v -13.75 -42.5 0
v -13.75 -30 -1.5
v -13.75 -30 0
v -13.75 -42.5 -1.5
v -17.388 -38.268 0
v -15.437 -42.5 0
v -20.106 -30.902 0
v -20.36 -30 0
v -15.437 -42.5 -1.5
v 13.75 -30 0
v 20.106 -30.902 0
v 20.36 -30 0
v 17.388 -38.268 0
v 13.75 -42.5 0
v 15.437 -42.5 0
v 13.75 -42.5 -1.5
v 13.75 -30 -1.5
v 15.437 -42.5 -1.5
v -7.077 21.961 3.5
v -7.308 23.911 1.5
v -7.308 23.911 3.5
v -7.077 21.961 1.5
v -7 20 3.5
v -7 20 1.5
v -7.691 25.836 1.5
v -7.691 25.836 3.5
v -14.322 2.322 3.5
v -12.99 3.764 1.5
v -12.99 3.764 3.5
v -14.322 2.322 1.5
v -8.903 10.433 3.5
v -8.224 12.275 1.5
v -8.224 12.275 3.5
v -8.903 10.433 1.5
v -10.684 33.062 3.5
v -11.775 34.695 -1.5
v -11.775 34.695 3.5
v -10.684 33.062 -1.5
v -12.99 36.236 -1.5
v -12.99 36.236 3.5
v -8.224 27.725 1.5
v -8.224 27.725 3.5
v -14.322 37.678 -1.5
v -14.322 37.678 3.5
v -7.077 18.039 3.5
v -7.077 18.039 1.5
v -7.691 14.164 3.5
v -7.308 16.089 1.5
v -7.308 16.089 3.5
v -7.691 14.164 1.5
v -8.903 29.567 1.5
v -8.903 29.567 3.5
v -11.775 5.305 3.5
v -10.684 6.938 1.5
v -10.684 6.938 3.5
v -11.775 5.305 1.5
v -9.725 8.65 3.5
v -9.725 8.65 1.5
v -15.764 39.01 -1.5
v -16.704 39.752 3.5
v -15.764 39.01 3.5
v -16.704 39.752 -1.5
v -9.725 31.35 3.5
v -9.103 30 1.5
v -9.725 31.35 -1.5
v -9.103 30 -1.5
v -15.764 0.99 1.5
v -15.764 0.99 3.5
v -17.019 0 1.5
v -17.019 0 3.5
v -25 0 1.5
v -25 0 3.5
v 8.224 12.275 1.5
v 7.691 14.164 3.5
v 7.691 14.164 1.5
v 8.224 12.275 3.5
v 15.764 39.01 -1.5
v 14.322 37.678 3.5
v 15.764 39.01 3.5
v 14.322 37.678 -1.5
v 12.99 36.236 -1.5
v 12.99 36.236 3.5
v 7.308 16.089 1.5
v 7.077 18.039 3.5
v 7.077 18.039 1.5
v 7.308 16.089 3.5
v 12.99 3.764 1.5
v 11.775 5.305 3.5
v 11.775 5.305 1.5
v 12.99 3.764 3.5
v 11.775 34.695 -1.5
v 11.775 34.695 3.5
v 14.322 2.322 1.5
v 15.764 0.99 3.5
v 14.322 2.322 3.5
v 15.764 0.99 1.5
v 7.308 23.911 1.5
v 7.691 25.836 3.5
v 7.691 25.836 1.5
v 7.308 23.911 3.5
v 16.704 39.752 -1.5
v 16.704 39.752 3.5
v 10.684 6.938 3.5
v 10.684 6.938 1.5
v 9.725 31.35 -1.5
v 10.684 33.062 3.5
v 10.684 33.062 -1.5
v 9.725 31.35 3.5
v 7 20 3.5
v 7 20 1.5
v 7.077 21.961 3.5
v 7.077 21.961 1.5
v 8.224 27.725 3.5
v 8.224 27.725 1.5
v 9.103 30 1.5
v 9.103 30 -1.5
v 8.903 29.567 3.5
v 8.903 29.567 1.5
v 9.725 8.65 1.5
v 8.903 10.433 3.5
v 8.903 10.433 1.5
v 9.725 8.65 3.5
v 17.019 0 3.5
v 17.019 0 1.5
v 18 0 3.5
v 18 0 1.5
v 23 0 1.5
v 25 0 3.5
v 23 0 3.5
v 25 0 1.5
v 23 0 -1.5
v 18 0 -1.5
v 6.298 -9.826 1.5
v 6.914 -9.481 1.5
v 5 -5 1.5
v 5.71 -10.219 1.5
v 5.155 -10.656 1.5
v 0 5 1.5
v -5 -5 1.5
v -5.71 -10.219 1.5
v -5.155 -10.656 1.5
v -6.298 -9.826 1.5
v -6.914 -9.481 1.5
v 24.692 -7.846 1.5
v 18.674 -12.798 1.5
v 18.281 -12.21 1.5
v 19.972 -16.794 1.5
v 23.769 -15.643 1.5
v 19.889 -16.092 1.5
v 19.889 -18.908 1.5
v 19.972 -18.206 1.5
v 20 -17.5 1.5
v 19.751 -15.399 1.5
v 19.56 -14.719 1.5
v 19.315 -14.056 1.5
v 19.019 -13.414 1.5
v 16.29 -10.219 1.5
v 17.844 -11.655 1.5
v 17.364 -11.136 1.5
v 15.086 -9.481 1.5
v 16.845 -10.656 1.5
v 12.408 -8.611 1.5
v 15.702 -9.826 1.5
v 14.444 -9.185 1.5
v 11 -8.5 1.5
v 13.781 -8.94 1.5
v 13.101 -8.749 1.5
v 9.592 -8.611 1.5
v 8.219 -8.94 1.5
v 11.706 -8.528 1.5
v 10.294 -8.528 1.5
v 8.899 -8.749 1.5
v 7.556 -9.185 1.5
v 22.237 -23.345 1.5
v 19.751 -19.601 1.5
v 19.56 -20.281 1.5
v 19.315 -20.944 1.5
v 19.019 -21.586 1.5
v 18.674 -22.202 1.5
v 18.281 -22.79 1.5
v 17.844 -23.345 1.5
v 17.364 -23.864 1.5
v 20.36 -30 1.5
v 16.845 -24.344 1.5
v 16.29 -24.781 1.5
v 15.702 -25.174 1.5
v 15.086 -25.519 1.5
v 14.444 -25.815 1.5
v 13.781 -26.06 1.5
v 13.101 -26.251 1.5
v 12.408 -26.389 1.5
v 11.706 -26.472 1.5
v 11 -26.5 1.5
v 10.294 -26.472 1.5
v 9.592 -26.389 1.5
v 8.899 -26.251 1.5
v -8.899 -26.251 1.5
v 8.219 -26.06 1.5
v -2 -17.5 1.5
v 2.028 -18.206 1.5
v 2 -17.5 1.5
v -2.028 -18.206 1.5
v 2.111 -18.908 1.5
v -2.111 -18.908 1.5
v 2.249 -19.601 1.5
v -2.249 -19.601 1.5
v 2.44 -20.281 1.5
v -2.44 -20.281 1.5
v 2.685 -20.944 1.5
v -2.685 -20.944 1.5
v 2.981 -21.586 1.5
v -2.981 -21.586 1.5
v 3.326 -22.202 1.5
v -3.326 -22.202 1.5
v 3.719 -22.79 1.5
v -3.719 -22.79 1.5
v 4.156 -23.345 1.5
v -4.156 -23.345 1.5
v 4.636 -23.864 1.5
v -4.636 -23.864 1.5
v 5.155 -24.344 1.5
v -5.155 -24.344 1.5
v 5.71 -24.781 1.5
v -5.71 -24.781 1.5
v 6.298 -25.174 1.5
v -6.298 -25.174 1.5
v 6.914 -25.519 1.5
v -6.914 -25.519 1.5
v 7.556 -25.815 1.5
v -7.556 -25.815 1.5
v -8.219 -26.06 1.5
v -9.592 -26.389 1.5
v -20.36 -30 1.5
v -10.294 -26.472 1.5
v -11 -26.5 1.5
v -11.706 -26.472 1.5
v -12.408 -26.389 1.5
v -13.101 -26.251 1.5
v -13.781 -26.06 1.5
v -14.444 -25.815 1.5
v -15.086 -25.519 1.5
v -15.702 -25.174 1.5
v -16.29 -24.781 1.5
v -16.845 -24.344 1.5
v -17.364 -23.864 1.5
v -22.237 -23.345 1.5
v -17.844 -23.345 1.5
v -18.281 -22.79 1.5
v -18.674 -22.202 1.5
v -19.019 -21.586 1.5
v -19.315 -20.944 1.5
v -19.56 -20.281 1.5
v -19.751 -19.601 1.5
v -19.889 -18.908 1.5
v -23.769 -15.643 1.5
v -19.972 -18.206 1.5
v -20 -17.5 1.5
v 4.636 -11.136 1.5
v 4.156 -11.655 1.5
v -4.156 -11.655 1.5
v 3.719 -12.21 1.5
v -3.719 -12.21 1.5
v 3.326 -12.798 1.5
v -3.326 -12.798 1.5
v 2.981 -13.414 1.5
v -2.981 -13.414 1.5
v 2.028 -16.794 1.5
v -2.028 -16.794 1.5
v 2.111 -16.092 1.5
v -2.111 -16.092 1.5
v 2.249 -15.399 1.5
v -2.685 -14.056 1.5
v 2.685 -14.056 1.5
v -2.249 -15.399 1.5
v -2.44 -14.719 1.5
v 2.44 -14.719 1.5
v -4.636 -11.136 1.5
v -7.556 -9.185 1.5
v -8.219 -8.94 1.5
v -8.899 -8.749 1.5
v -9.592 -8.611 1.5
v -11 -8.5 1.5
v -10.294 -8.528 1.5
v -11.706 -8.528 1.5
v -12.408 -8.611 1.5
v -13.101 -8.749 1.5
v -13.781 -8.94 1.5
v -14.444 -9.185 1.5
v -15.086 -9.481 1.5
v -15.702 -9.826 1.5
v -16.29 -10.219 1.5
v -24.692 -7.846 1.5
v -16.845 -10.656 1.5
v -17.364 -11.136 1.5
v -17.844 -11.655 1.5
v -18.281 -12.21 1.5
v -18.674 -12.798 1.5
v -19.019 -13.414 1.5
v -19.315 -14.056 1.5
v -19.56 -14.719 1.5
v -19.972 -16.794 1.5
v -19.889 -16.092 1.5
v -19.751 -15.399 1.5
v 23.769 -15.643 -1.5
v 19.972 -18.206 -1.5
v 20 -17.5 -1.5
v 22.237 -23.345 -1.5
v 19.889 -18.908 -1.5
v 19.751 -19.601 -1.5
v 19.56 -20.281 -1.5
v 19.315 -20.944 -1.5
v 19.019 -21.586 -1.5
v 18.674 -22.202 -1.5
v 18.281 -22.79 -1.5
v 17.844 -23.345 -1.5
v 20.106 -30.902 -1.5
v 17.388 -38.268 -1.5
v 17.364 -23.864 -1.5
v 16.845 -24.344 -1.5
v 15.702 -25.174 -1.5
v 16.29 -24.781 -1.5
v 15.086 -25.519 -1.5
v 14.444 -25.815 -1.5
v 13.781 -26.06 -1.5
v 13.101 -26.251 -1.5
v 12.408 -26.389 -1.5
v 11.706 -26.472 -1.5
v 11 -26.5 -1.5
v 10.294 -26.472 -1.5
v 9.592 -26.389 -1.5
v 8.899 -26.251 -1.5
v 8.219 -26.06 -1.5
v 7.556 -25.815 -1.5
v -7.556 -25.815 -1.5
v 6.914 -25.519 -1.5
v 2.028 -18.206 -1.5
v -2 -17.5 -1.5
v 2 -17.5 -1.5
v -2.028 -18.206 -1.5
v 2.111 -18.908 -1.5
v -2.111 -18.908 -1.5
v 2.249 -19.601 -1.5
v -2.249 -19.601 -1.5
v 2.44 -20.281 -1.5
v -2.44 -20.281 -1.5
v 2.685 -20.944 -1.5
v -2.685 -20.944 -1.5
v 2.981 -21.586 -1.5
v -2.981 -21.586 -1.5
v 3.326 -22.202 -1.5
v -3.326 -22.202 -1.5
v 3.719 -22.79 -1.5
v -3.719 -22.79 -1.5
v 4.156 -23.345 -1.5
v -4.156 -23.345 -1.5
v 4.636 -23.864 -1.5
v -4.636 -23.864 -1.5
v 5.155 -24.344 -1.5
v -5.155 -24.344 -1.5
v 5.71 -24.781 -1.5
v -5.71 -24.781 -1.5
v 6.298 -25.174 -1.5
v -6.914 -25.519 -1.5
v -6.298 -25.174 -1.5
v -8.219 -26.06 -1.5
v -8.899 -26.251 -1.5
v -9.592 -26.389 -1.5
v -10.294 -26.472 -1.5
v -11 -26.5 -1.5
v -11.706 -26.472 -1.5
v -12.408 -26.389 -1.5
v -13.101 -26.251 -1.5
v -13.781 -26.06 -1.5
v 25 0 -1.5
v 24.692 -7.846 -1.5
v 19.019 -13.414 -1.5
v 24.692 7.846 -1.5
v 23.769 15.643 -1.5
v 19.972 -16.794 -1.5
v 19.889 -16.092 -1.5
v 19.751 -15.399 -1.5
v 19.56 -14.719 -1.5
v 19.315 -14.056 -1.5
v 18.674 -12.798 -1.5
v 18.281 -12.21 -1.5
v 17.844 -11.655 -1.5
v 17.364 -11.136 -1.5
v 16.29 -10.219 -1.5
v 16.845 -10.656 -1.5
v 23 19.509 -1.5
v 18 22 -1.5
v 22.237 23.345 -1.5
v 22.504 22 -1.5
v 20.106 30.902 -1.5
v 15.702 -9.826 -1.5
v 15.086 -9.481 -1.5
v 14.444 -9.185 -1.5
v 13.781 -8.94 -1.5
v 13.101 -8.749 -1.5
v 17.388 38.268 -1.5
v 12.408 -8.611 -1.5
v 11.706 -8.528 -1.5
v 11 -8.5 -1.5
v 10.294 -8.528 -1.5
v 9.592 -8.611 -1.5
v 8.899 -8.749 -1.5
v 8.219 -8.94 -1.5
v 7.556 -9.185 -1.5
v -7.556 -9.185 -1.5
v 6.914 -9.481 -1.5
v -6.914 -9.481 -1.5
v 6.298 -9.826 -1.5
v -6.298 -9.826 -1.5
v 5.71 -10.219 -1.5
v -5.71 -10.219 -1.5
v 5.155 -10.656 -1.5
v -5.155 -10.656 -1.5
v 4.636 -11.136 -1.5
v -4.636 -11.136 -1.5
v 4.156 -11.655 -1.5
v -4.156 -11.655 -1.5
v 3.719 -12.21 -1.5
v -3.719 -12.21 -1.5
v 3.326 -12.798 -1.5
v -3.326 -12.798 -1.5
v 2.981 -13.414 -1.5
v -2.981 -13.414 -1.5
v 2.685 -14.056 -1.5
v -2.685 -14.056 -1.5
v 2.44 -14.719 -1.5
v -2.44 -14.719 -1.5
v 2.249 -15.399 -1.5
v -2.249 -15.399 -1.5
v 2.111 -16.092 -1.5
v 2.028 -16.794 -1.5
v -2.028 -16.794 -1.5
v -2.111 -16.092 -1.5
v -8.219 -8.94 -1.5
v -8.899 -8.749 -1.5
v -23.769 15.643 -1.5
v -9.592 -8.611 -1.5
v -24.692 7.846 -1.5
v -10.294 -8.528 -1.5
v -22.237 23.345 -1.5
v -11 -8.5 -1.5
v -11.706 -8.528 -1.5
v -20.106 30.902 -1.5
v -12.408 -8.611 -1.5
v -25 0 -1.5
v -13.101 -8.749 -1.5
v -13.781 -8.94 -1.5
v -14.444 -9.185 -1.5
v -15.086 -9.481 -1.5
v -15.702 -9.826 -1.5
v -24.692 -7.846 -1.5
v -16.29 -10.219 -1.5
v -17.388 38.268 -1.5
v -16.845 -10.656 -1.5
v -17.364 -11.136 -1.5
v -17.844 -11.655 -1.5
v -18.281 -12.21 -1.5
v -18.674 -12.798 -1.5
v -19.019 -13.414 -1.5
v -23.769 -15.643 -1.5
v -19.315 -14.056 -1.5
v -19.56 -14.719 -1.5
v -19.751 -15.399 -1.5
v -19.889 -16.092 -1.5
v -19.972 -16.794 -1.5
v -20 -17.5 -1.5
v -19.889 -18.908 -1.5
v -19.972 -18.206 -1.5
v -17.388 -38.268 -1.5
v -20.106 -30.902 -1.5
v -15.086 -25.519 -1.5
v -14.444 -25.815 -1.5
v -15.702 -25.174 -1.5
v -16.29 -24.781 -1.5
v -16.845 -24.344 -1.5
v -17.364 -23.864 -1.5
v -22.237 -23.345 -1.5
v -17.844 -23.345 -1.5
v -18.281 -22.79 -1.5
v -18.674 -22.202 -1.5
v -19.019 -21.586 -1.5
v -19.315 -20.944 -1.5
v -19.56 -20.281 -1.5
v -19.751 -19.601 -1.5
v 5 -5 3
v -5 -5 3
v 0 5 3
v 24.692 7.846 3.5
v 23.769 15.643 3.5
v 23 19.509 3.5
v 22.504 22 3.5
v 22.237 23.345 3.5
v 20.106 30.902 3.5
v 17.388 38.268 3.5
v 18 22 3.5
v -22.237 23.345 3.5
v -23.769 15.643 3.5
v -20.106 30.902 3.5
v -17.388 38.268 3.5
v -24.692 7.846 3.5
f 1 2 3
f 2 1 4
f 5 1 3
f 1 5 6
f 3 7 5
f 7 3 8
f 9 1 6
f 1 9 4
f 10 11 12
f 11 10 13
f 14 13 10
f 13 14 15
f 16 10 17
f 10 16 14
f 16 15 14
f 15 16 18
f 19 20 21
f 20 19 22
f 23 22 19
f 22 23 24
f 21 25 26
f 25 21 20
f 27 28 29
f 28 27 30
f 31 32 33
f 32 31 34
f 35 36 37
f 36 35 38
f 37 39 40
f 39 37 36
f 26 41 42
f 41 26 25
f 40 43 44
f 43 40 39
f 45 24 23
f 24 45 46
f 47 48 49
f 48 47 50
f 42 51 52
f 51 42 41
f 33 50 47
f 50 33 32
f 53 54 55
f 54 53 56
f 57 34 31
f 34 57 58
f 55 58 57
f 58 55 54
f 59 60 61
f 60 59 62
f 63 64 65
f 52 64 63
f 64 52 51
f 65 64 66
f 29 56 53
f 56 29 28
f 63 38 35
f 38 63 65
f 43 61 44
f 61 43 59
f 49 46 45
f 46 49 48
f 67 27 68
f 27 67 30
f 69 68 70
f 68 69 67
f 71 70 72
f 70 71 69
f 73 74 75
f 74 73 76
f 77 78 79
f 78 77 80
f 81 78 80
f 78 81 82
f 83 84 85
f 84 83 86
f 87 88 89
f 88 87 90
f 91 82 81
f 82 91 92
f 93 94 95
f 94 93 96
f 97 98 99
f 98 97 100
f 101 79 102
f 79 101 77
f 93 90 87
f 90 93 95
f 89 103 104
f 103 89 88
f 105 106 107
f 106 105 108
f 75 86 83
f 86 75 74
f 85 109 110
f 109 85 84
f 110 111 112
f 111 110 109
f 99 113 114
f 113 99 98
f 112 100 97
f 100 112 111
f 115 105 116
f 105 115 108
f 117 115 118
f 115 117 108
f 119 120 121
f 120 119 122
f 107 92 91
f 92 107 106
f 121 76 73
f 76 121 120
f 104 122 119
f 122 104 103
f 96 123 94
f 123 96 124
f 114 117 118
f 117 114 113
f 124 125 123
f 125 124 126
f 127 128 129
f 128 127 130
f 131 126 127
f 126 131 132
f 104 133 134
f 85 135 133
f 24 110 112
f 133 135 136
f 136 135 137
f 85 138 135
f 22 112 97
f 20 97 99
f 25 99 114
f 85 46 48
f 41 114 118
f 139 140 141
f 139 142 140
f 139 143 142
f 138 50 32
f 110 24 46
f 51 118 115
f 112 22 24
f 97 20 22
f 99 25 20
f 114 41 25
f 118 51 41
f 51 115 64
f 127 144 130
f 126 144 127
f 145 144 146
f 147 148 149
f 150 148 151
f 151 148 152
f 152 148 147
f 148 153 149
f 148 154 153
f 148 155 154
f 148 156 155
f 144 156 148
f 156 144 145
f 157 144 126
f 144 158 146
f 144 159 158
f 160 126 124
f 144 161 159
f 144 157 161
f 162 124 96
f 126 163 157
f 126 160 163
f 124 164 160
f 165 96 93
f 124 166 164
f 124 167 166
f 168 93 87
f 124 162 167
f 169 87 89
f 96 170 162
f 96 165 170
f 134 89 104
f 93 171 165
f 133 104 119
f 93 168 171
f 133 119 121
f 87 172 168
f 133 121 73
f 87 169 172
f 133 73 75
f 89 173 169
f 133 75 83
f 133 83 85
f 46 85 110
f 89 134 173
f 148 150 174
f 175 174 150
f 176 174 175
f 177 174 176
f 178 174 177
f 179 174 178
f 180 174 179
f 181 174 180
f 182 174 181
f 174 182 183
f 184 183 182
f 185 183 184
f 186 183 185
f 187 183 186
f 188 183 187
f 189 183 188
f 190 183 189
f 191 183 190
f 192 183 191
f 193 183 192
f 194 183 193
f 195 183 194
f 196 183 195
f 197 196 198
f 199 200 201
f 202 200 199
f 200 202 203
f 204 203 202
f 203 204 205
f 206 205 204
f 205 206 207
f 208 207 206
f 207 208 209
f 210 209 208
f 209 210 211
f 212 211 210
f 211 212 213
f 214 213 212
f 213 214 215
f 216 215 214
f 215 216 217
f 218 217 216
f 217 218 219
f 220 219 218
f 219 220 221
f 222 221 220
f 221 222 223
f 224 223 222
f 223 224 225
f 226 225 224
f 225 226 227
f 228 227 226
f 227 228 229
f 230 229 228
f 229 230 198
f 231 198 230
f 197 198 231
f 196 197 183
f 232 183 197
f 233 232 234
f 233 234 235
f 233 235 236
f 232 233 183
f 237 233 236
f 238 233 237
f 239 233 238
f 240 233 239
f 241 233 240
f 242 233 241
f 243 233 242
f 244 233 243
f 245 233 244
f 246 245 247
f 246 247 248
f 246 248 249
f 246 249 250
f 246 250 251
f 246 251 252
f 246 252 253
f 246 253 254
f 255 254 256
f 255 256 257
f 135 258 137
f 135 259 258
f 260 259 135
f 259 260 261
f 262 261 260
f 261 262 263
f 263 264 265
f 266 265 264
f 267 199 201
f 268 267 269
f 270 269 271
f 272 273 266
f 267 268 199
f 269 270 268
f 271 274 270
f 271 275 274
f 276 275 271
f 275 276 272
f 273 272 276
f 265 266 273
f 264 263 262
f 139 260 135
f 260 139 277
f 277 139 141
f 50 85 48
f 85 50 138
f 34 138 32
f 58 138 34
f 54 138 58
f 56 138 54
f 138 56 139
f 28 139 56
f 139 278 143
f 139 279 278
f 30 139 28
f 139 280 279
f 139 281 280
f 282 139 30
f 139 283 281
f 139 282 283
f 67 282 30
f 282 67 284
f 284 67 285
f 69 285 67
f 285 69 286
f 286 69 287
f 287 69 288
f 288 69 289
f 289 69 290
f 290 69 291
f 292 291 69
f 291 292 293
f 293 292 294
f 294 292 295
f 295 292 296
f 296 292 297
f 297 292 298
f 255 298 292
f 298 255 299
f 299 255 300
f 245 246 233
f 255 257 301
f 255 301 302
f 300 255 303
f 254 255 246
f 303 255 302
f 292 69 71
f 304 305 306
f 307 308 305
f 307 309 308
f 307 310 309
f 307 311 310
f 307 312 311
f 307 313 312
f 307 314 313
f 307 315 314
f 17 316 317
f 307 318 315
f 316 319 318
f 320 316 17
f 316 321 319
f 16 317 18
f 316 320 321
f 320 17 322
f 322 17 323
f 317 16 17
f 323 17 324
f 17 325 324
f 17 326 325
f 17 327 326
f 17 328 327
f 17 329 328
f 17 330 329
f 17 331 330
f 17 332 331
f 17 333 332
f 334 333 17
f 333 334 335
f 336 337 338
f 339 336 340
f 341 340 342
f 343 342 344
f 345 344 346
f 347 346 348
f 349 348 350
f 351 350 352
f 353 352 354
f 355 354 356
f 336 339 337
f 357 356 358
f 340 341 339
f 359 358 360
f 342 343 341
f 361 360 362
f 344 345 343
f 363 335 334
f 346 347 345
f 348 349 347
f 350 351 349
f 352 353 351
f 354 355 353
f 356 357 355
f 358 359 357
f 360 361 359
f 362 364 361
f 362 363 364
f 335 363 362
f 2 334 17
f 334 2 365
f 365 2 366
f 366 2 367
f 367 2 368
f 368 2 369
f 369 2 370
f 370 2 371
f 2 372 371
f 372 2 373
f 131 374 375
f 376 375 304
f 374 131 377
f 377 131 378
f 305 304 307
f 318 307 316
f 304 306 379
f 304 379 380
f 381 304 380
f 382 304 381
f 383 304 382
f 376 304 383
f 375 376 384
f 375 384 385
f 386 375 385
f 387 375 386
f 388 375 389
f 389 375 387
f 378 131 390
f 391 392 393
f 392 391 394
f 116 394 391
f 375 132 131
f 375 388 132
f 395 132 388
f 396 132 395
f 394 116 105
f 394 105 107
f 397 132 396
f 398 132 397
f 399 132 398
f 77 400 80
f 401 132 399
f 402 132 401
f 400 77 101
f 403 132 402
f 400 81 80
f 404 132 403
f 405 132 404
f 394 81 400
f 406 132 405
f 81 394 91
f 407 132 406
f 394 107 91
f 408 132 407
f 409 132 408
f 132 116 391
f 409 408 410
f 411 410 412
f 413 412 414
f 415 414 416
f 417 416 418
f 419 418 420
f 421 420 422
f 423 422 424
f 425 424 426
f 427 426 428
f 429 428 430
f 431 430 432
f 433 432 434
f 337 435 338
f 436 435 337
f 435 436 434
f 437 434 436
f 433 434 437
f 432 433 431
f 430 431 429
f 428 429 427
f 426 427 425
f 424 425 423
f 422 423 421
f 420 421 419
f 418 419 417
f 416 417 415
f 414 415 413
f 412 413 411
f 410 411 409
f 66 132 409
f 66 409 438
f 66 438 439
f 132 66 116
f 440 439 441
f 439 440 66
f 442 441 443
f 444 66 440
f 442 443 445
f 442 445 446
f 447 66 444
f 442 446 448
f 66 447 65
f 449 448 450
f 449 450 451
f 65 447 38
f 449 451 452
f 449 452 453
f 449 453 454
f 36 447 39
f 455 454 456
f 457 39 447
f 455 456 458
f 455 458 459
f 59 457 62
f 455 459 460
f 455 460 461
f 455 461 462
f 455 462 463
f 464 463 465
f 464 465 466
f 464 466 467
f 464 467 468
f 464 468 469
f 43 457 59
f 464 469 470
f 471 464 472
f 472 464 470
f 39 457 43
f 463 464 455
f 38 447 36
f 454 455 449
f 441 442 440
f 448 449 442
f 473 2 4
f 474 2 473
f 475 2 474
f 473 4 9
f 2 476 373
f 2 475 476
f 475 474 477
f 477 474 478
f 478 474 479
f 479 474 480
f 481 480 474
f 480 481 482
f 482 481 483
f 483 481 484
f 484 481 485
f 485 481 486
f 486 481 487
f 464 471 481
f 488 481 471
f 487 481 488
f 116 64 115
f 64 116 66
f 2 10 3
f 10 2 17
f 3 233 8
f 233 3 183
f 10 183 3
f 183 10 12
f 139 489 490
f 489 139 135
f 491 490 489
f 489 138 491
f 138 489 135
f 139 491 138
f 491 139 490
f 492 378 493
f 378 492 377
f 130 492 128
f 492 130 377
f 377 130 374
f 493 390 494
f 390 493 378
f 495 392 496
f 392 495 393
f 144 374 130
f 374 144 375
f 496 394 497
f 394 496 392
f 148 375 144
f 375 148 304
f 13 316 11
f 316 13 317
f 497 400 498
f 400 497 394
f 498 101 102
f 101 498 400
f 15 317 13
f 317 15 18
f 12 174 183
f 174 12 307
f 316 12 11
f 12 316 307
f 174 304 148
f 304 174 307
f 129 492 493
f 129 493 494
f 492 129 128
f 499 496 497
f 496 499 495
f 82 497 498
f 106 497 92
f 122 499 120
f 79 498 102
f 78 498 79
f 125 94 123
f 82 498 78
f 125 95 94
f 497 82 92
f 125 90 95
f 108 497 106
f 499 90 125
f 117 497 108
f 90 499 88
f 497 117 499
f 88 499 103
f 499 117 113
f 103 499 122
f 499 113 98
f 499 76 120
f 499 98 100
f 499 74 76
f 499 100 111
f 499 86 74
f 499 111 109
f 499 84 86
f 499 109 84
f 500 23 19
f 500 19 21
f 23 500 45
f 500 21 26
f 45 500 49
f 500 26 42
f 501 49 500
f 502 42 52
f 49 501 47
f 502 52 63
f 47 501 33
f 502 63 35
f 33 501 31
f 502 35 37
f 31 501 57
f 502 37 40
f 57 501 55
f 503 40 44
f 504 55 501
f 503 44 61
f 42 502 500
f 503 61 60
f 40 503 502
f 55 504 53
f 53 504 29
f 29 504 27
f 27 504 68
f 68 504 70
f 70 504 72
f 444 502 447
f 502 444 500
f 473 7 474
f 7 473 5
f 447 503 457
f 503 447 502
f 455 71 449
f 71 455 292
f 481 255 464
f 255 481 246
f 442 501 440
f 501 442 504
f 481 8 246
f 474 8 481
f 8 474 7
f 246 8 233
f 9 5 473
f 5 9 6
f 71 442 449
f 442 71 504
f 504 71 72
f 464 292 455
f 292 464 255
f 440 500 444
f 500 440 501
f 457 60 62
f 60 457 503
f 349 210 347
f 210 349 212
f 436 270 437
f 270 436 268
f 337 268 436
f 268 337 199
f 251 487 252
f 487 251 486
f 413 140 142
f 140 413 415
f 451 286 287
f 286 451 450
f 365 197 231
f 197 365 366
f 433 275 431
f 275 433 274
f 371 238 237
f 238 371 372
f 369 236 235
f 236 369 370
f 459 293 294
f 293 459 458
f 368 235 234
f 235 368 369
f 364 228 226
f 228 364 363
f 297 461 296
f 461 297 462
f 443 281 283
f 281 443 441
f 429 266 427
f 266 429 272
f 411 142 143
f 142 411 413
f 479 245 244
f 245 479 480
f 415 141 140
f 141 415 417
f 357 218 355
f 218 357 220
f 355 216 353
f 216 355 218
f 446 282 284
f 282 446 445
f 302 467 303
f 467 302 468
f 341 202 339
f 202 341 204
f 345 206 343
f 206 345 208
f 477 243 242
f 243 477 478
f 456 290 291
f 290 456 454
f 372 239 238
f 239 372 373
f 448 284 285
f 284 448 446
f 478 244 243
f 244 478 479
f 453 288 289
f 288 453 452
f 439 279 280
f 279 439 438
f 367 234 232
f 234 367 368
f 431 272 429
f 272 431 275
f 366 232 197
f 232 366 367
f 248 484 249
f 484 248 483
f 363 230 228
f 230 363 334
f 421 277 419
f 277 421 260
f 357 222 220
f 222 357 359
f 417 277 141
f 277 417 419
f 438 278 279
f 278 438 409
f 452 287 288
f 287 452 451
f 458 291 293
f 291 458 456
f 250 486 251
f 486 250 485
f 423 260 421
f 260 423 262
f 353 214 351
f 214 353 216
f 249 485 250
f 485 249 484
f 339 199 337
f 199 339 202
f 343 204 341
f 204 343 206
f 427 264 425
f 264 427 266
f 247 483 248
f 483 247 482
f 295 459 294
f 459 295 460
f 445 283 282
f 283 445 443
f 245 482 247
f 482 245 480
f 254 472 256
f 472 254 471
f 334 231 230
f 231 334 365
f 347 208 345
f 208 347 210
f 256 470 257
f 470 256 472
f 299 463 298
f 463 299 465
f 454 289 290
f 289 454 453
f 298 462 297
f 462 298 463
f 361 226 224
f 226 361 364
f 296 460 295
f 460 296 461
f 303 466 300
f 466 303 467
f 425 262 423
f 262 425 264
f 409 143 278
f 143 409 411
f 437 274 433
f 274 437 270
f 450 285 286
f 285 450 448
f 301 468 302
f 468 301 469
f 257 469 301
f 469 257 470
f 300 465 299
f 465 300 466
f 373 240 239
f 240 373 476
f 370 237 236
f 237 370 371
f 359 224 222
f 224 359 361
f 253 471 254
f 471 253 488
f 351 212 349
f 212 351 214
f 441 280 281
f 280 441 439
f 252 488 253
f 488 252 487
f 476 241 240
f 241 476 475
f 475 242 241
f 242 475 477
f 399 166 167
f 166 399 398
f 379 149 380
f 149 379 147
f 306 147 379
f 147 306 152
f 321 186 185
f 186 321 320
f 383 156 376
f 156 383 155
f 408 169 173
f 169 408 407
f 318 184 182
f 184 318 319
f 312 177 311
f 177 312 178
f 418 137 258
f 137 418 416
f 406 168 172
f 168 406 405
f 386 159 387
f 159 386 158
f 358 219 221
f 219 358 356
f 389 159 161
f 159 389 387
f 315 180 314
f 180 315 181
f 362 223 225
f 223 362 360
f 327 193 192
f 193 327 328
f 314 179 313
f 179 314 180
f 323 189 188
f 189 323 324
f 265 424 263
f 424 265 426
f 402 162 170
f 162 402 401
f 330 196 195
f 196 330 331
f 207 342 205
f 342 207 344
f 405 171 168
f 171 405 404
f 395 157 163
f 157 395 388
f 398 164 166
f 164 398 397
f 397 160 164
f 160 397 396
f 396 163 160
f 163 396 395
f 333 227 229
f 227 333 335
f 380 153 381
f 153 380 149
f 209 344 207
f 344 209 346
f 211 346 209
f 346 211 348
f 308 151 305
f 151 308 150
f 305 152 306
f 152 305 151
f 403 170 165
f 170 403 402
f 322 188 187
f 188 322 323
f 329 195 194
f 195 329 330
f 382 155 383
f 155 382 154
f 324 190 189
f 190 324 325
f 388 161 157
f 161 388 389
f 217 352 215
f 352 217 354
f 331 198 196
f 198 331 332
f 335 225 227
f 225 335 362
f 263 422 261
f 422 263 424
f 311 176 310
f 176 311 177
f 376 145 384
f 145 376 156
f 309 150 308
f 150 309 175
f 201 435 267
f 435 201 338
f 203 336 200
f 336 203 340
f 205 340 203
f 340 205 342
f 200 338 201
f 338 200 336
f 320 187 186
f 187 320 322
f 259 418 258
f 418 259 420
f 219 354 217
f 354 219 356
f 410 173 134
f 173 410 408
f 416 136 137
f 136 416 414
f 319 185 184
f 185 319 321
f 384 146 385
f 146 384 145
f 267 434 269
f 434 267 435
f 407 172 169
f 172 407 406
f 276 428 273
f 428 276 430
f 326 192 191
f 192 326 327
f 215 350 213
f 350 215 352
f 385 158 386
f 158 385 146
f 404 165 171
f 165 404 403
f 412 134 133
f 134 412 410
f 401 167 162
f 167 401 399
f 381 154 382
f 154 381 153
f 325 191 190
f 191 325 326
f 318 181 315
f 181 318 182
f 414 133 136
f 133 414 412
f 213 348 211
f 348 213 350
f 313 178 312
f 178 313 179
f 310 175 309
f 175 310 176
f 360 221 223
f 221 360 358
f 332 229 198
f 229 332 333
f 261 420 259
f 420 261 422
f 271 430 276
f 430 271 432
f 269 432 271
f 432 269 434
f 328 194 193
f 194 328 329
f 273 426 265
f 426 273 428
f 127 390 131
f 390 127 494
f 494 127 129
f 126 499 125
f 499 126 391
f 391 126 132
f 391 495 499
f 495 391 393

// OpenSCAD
// [FL_INDEX: keywords="openscad, 3d_parametric, Customizable_Owl_cable_wrapper, csg_solid" | COT="Parametric OpenSCAD design from 3DCodeverse"]
// Title: Customizable Owl cable wrapper

// eye radius if size_factor = 1
eye_r = 9;  // [0:20]
eye_distance = 2*eye_r+4;
// move wing position up or down
wing_offset = 5;   //[-10:10]
// width for the plug hole in the wing if size_factor = 1
plug_width = 5;   //[0:20]
// height for the plug hole in the wing if size_factor = 1
plug_height = 22; //[0:50]
// horizontal offset position for the plug hole in the wing
plug_offset = 13;  //[0:20]
// size factor of the owl, if 1 body owl is 100mm x 60 mm
size_factor = 1;
// thickness (height) of the owl, if 1 ears are 2 mm, body 3mm
height_size_factor = 1.;

difference() {
     union () {
          // ears & body
          intersection() {
               union() {
                    // corpus limits
                    cube(size=[100*size_factor, 60*size_factor, 3*height_size_factor], center=true);
                    // blocks forming ears
                    for ( a=[-1,1] ) {
                         translate([a*17.5*size_factor,-35*size_factor,-1*height_size_factor])
                              cube(size=[7.5*size_factor,15*size_factor,2*height_size_factor], center=true);
                    }
                    // nose
                    linear_extrude(height=6*height_size_factor,center=true)
                         polygon(points=[[-5*size_factor,-5*size_factor],[5*size_factor,-5*size_factor],[0*size_factor,5*size_factor]],
                                 paths=[[0,1,2]]
                              );
                    // wings
                    translate([0,wing_offset,0])
                    for ( a=[-1,1] ) {
                         intersection () {
                              translate([a*32*size_factor,15*size_factor,0])
                                   cylinder(h=15*height_size_factor, r=25*size_factor, center=true, $fn=80);
                              translate([0,17.5*size_factor,0])
                                   cube(size=[100*size_factor,45*size_factor,7.5*height_size_factor], center=true);
                         }
                    }
               }

               // rounded sides
               translate([0,0,1*height_size_factor])
                    intersection_for ( a=[-1,1] ) {
                    translate([a*75*size_factor,0,0])
                         cylinder(h=5*height_size_factor, r=100*size_factor, center=true, $fn=80);
                    }
          }
          // feet
          * for ( a=[-1,1] ) {
               translate([a*12.5*size_factor, (27.5)*size_factor, 0])
                    cylinder(h=3*height_size_factor, r=8*size_factor, center=true, $fn=80);
          }
     }
     // eyes
     for ( a=[-1,1] ) {
          translate([a*(eye_distance/2)*size_factor,-17.5*size_factor,0])
               cylinder(h=10*height_size_factor, r=eye_r*size_factor, center=true, $fn=80);
     }
     // slot for plug
     translate([(plug_offset+plug_width)*size_factor,0,-12.5*height_size_factor])
          cube(size=[plug_width*size_factor,plug_height*size_factor,25*height_size_factor]);
}
